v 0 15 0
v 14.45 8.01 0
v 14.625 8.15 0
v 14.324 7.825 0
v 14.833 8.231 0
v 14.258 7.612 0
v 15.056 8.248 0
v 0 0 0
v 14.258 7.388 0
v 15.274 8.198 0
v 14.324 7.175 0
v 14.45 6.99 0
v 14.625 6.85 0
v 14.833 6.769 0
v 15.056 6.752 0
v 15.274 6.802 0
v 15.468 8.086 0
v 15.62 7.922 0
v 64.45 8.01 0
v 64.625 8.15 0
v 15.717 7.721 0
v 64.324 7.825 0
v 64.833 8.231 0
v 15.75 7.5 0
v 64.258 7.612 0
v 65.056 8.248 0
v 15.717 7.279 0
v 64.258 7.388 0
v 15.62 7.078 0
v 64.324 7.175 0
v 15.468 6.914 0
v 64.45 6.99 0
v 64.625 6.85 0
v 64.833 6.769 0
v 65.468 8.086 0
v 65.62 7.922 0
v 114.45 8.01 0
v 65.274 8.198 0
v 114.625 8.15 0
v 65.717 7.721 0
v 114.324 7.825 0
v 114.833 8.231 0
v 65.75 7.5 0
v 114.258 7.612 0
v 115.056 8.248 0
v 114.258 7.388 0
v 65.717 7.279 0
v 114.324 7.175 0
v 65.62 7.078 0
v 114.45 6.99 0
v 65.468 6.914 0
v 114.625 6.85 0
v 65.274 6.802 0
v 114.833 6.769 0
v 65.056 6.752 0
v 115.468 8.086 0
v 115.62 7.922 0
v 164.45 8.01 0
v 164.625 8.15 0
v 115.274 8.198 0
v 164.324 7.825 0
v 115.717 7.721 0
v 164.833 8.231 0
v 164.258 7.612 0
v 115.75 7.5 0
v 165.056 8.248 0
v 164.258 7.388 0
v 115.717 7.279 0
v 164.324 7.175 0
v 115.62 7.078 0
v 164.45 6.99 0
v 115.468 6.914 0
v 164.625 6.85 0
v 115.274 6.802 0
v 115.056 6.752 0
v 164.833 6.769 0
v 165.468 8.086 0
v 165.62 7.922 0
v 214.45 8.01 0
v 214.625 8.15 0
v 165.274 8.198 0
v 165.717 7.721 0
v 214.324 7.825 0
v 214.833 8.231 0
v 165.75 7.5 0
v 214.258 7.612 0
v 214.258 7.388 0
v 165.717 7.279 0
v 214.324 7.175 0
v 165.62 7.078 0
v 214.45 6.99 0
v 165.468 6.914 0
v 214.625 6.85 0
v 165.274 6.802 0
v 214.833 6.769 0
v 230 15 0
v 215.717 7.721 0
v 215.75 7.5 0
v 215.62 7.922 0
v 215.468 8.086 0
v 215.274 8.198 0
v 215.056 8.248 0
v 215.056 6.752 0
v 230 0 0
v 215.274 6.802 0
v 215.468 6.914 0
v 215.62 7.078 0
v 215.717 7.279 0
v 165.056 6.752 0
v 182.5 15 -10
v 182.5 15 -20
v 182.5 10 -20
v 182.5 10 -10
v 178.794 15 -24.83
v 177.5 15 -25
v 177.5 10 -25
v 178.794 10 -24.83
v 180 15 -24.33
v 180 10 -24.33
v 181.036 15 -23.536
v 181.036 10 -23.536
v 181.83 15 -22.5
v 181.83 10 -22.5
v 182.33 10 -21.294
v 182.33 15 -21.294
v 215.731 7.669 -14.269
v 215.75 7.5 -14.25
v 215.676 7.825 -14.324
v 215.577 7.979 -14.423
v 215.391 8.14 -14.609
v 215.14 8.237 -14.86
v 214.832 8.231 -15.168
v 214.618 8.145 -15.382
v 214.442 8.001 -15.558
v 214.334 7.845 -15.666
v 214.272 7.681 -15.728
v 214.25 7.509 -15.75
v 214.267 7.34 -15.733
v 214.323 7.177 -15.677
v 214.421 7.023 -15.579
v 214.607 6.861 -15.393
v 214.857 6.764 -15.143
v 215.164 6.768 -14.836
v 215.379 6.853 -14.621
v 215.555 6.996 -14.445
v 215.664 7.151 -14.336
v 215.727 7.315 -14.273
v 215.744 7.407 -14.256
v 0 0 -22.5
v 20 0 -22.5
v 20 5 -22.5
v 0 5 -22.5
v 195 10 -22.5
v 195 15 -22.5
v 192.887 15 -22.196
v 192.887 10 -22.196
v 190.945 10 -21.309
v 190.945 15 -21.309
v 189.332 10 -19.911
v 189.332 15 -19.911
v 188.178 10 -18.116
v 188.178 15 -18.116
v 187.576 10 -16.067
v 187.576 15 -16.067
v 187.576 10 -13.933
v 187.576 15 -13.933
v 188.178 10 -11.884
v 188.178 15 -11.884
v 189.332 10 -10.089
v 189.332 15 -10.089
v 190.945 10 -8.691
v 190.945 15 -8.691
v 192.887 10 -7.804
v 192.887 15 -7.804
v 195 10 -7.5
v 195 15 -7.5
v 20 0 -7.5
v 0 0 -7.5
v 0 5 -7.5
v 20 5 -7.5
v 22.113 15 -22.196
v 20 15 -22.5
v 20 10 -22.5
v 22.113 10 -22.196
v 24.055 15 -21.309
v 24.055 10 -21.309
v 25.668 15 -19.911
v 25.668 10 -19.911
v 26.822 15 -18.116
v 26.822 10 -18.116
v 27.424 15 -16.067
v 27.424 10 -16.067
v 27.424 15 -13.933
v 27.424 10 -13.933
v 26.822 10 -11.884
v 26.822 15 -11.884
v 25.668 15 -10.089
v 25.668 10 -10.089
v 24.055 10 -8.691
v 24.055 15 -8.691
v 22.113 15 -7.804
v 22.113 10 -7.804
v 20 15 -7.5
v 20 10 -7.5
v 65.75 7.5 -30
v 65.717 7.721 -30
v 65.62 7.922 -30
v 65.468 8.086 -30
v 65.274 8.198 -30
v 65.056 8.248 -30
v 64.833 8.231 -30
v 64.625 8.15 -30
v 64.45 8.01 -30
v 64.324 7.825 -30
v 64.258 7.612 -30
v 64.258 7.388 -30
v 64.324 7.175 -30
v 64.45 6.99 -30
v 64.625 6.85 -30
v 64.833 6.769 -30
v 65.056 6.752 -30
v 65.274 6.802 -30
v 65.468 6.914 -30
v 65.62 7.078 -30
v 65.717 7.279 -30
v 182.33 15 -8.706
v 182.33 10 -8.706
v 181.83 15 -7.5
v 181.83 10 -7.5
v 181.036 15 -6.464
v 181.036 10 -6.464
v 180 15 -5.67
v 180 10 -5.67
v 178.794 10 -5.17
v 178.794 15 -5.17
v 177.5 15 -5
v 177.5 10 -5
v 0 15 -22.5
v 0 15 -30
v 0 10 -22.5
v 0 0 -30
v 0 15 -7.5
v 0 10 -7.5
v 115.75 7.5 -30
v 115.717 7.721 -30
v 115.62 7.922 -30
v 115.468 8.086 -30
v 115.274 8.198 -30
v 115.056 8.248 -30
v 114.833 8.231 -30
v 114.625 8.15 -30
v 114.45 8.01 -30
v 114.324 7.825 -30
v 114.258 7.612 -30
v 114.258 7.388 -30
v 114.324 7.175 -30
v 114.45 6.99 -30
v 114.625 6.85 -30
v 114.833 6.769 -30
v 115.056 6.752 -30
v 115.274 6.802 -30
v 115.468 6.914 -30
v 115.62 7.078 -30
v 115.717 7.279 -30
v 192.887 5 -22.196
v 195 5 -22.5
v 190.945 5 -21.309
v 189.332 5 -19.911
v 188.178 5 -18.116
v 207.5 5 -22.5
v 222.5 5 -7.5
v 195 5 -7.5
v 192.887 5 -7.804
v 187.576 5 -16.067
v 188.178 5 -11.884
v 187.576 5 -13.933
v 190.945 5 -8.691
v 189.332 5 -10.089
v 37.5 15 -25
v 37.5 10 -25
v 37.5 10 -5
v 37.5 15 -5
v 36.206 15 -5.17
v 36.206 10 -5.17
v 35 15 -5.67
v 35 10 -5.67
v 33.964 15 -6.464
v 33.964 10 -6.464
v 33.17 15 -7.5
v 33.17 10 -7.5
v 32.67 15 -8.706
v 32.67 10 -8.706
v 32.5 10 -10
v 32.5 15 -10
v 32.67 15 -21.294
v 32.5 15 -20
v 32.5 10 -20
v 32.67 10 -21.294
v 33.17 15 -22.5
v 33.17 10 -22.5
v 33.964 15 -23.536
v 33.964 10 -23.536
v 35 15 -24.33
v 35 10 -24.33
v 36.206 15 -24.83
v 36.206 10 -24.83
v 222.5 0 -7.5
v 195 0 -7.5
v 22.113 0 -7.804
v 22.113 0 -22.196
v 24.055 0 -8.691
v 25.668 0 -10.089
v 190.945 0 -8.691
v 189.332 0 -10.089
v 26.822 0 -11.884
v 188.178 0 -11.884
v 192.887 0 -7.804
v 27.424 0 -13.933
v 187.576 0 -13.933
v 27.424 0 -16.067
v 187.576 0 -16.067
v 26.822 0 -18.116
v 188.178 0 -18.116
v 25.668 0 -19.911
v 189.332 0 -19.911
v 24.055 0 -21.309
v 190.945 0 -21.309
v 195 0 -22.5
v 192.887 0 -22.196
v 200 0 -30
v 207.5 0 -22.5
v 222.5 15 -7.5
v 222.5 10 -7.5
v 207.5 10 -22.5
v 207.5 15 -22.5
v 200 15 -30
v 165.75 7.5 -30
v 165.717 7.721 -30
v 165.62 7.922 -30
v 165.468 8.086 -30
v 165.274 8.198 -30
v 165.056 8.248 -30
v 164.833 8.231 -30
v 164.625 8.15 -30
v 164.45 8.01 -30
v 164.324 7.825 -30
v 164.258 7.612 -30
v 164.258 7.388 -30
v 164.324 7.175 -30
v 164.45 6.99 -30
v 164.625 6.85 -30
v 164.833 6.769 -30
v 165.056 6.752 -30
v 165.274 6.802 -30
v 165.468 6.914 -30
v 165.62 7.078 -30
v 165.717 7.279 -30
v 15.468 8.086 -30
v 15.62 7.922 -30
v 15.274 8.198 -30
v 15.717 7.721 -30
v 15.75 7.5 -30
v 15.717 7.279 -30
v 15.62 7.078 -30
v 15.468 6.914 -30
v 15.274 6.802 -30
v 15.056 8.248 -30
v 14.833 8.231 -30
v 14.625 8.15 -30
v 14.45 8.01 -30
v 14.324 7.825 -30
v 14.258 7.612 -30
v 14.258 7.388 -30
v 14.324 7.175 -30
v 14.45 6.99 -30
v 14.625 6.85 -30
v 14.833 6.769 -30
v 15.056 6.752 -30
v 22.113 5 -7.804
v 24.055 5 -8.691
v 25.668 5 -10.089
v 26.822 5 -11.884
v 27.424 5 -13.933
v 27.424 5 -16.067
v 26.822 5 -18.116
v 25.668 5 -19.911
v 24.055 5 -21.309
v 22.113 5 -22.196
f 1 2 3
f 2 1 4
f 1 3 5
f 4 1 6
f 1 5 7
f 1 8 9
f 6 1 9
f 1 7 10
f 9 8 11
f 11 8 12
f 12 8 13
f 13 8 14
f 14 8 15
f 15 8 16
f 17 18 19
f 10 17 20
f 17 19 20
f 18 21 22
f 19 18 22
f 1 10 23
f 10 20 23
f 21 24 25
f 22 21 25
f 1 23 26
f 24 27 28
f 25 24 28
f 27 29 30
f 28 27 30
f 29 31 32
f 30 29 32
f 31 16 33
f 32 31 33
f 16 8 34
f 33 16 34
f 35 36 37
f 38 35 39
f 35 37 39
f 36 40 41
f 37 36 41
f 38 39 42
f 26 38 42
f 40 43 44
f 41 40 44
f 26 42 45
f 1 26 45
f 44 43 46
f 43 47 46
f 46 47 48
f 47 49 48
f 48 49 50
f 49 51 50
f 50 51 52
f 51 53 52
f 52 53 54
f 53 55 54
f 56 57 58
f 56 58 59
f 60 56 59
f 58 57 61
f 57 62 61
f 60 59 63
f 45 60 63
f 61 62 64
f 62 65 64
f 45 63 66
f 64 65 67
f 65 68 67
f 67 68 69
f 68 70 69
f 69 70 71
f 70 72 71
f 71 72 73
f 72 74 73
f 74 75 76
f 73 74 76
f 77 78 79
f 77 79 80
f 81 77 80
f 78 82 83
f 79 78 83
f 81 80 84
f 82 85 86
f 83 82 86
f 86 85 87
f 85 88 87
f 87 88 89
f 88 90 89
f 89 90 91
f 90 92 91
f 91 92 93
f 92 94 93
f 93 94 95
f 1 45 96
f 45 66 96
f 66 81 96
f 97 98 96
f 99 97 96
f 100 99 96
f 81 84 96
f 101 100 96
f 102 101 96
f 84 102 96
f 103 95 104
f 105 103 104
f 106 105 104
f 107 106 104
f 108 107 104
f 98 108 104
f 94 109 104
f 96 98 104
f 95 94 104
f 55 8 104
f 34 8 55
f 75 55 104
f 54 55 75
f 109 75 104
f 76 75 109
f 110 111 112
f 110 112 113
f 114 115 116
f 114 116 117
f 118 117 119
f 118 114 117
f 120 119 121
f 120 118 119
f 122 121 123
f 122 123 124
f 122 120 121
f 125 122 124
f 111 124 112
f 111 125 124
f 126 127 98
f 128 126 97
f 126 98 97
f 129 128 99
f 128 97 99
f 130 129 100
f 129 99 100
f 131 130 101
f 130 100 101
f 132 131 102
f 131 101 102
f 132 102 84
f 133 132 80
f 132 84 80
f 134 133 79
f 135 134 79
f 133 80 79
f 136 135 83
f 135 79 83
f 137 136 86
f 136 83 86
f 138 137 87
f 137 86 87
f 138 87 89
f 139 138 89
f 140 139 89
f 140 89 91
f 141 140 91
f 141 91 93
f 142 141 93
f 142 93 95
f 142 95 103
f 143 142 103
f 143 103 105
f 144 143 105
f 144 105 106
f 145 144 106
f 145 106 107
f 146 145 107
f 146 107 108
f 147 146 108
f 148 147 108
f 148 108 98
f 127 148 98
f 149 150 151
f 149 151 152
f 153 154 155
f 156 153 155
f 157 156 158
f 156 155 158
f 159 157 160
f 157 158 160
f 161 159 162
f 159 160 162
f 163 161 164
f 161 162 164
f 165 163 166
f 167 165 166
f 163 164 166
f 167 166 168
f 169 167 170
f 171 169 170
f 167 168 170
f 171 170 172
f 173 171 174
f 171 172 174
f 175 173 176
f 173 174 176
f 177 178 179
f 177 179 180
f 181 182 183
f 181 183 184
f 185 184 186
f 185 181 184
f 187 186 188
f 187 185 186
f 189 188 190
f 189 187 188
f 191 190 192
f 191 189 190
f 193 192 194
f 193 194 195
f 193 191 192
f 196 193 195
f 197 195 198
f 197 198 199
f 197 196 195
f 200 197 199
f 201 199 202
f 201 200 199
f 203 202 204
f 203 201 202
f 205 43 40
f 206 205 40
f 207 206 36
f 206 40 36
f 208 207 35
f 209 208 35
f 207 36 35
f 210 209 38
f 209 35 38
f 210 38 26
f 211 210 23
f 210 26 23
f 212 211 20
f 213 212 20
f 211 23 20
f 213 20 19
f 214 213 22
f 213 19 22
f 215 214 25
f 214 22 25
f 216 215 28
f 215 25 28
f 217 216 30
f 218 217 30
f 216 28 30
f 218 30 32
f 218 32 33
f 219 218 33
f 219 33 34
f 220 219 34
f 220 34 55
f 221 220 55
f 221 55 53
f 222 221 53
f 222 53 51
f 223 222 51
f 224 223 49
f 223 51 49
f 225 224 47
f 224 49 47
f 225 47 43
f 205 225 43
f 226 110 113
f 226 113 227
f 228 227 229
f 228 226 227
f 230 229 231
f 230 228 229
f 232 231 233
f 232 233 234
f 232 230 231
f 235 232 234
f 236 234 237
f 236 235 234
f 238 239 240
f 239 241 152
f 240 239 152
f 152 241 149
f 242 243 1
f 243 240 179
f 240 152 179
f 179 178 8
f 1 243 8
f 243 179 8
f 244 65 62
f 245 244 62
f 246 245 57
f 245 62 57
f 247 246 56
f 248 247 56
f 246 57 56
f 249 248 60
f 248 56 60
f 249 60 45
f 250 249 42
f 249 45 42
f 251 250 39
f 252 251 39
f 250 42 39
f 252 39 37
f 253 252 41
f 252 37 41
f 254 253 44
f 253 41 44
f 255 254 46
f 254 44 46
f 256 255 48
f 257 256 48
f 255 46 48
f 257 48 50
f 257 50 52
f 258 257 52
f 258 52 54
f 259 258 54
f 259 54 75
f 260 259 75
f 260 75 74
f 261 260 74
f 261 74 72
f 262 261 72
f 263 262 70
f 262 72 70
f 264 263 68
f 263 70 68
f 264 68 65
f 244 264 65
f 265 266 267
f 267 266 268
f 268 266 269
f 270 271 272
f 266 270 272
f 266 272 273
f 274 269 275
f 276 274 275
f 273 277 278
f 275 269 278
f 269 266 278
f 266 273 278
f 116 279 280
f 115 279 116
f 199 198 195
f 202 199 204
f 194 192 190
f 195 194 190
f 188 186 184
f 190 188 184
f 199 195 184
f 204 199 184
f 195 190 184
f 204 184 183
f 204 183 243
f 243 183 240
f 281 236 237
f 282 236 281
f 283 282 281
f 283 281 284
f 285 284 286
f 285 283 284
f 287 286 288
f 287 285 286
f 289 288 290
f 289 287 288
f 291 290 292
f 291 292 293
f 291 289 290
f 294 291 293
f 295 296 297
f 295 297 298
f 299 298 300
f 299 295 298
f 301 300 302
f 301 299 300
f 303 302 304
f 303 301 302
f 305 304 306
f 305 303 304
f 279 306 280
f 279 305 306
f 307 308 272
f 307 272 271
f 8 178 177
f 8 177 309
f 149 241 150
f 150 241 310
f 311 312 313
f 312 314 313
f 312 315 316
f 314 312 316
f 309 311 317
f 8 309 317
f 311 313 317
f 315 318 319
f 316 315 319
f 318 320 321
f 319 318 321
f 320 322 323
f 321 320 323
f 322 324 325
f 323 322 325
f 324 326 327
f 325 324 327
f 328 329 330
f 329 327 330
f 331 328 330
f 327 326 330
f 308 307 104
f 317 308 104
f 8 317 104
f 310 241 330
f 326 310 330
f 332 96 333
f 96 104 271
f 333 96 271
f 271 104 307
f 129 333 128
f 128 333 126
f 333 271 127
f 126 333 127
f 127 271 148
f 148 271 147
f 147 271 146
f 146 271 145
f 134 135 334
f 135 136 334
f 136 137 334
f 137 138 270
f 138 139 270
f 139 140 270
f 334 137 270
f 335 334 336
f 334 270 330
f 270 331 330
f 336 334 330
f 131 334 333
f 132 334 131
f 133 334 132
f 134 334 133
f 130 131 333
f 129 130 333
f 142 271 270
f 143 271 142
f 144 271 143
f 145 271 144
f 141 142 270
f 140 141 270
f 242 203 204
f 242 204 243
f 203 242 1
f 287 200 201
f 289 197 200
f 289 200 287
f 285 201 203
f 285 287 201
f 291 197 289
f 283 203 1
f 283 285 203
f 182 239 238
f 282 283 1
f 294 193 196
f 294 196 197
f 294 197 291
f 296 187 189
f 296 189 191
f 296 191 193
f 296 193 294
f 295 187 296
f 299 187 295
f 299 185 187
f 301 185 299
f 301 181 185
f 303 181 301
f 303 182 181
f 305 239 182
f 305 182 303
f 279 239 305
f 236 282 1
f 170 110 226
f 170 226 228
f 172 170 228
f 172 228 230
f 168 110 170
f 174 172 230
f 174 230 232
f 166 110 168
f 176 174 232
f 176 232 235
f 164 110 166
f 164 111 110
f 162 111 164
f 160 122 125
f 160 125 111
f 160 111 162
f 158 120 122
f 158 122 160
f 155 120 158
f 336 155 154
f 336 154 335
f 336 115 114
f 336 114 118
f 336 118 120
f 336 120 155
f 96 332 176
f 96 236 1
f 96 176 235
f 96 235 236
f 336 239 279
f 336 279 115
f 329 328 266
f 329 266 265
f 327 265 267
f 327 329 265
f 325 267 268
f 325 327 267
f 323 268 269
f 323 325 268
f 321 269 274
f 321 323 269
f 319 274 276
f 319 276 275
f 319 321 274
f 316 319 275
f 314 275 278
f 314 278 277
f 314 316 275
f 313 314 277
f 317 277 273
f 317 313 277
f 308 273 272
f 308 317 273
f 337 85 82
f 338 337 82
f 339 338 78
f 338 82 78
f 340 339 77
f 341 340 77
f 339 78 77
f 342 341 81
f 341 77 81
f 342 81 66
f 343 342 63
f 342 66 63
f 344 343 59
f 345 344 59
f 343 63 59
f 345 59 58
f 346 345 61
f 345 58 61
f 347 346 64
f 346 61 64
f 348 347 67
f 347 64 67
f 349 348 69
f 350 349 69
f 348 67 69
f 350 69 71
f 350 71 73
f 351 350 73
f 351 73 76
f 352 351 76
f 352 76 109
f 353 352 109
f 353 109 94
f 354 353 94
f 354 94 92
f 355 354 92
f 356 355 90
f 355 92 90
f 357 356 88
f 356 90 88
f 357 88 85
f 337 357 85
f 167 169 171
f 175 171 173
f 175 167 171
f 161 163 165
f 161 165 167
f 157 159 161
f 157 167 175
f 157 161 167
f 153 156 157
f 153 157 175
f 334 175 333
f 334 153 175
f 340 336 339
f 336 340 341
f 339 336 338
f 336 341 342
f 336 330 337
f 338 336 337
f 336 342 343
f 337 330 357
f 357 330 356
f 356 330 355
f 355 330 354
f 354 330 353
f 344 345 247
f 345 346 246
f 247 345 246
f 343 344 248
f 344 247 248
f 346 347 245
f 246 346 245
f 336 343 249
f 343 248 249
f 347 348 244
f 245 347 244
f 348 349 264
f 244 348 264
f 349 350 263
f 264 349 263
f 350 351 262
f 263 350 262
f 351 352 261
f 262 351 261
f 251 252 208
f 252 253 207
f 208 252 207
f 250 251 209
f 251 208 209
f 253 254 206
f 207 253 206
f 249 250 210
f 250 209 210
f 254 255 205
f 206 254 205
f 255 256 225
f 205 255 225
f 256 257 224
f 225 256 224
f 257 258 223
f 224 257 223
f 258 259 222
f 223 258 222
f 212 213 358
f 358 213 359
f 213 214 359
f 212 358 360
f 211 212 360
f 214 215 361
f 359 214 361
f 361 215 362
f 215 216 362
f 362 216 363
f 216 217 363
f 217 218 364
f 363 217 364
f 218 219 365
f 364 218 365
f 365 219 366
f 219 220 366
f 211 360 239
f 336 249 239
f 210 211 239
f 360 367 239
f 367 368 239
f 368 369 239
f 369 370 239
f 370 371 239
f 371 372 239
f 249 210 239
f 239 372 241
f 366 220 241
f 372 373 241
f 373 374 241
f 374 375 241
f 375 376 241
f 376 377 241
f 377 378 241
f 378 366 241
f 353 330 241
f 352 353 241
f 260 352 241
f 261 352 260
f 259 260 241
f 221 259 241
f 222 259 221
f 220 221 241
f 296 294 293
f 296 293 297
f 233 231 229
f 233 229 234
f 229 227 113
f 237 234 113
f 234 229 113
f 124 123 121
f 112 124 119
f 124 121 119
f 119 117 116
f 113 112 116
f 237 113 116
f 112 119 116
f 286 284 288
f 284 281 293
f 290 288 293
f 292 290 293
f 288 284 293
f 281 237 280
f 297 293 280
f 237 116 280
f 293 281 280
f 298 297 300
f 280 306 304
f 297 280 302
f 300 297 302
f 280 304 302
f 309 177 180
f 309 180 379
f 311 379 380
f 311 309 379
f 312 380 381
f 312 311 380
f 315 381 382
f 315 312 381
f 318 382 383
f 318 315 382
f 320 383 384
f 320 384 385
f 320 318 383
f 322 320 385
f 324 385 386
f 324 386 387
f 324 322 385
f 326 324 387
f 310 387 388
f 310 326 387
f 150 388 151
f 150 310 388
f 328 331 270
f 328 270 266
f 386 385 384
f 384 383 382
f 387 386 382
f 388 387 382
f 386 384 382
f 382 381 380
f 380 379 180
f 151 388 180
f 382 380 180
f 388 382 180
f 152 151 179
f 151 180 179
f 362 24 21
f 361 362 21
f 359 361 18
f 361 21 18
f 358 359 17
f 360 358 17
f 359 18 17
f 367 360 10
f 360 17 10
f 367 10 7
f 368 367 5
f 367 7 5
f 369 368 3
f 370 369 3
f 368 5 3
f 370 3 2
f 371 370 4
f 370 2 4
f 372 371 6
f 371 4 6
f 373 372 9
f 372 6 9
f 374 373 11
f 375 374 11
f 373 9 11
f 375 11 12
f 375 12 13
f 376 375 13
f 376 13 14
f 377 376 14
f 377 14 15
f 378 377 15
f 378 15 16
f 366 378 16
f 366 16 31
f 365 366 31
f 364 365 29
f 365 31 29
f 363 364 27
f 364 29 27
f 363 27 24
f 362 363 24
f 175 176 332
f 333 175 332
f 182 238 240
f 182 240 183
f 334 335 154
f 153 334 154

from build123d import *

# Parameters (mm, degrees)
BOSS_EXTRUDE1_DEPTH = 15
CUT_EXTRUDE1_DEPTH  = 5
CUT_EXTRUDE2_DEPTH  = 5
SKETCH4_R           = 0.75
CUT_EXTRUDE3_DEPTH  = 30
CUT_EXTRUDE4_DEPTH  = 5


with BuildPart() as part:
    # Sketch1 → Boss-Extrude1 (new body)
    with BuildSketch(Plane(origin=(0, 0, 0), x_dir=(1, 0, 0), z_dir=(0, 1, 0))):
        Polygon((0, 0), (230, 0), (200, 30), (0, 30), align=None)
    extrude(amount=BOSS_EXTRUDE1_DEPTH)

    # Sketch2 → Cut-Extrude1 (cut)
    with BuildSketch(Plane(origin=(0, 15, 0), x_dir=(1, 0, 0), z_dir=(0, 1, 0))):
        with BuildLine():
            Line((-20, 22.5), (20, 22.5))
            ThreePointArc((20, 22.5), (27.5, 15), (20, 7.5))
            Line((20, 7.5), (-20, 7.5))
            ThreePointArc((-20, 7.5), (-27.5, 15), (-20, 22.5))
        make_face()
        with BuildLine():
            Line((235, 22.5), (195, 22.5))
            ThreePointArc((195, 22.5), (187.5, 15), (195, 7.5))
            Line((195, 7.5), (235, 7.5))
            ThreePointArc((235, 7.5), (242.5, 15), (235, 22.5))
        make_face()
    extrude(amount=-CUT_EXTRUDE1_DEPTH, mode=Mode.SUBTRACT)

    # Sketch3 → Cut-Extrude2 (cut)
    with BuildSketch(Plane.XZ):
        with BuildLine():
            Line((195, -7.5), (222.5, -7.5))
            Line((222.5, -7.5), (207.5, -22.5))
            Line((207.5, -22.5), (195, -22.5))
            ThreePointArc((195, -22.5), (187.5, -15), (195, -7.5))
        make_face()
        with BuildLine():
            Line((0, -22.5), (0, -7.5))
            Line((0, -7.5), (20, -7.5))
            ThreePointArc((20, -7.5), (27.5, -15), (20, -22.5))
            Line((20, -22.5), (0, -22.5))
        make_face()
    extrude(amount=-CUT_EXTRUDE2_DEPTH, mode=Mode.SUBTRACT)

    # Sketch4 → Cut-Extrude3 (cut)
    with BuildSketch(Plane.XY):
        with Locations((115, 7.5)):
            Circle(SKETCH4_R)
        with Locations((165, 7.5)):
            Circle(SKETCH4_R)
        with Locations((215, 7.5)):
            Circle(SKETCH4_R)
        with Locations((65, 7.5)):
            Circle(SKETCH4_R)
        with Locations((15, 7.5)):
            Circle(SKETCH4_R)
    extrude(amount=-CUT_EXTRUDE3_DEPTH, mode=Mode.SUBTRACT)

    # Sketch5 → Cut-Extrude4 (cut)
    with BuildSketch(Plane(origin=(0, 15, 0), x_dir=(1, 0, 0), z_dir=(0, 1, 0))):
        with BuildLine():
            Line((37.5, 25), (177.5, 25))
            ThreePointArc((177.5, 25), (181.035533906, 23.535533906), (182.5, 20))
            Line((182.5, 20), (182.5, 10))
            ThreePointArc((182.5, 10), (181.035533906, 6.464466094), (177.5, 5))
            Line((177.5, 5), (37.5, 5))
            ThreePointArc((37.5, 5), (33.964466094, 6.464466094), (32.5, 10))
            Line((32.5, 10), (32.5, 20))
            ThreePointArc((32.5, 20), (33.964466094, 23.535533906), (37.5, 25))
        make_face()
    extrude(amount=-CUT_EXTRUDE4_DEPTH, mode=Mode.SUBTRACT)


solid = part.part
